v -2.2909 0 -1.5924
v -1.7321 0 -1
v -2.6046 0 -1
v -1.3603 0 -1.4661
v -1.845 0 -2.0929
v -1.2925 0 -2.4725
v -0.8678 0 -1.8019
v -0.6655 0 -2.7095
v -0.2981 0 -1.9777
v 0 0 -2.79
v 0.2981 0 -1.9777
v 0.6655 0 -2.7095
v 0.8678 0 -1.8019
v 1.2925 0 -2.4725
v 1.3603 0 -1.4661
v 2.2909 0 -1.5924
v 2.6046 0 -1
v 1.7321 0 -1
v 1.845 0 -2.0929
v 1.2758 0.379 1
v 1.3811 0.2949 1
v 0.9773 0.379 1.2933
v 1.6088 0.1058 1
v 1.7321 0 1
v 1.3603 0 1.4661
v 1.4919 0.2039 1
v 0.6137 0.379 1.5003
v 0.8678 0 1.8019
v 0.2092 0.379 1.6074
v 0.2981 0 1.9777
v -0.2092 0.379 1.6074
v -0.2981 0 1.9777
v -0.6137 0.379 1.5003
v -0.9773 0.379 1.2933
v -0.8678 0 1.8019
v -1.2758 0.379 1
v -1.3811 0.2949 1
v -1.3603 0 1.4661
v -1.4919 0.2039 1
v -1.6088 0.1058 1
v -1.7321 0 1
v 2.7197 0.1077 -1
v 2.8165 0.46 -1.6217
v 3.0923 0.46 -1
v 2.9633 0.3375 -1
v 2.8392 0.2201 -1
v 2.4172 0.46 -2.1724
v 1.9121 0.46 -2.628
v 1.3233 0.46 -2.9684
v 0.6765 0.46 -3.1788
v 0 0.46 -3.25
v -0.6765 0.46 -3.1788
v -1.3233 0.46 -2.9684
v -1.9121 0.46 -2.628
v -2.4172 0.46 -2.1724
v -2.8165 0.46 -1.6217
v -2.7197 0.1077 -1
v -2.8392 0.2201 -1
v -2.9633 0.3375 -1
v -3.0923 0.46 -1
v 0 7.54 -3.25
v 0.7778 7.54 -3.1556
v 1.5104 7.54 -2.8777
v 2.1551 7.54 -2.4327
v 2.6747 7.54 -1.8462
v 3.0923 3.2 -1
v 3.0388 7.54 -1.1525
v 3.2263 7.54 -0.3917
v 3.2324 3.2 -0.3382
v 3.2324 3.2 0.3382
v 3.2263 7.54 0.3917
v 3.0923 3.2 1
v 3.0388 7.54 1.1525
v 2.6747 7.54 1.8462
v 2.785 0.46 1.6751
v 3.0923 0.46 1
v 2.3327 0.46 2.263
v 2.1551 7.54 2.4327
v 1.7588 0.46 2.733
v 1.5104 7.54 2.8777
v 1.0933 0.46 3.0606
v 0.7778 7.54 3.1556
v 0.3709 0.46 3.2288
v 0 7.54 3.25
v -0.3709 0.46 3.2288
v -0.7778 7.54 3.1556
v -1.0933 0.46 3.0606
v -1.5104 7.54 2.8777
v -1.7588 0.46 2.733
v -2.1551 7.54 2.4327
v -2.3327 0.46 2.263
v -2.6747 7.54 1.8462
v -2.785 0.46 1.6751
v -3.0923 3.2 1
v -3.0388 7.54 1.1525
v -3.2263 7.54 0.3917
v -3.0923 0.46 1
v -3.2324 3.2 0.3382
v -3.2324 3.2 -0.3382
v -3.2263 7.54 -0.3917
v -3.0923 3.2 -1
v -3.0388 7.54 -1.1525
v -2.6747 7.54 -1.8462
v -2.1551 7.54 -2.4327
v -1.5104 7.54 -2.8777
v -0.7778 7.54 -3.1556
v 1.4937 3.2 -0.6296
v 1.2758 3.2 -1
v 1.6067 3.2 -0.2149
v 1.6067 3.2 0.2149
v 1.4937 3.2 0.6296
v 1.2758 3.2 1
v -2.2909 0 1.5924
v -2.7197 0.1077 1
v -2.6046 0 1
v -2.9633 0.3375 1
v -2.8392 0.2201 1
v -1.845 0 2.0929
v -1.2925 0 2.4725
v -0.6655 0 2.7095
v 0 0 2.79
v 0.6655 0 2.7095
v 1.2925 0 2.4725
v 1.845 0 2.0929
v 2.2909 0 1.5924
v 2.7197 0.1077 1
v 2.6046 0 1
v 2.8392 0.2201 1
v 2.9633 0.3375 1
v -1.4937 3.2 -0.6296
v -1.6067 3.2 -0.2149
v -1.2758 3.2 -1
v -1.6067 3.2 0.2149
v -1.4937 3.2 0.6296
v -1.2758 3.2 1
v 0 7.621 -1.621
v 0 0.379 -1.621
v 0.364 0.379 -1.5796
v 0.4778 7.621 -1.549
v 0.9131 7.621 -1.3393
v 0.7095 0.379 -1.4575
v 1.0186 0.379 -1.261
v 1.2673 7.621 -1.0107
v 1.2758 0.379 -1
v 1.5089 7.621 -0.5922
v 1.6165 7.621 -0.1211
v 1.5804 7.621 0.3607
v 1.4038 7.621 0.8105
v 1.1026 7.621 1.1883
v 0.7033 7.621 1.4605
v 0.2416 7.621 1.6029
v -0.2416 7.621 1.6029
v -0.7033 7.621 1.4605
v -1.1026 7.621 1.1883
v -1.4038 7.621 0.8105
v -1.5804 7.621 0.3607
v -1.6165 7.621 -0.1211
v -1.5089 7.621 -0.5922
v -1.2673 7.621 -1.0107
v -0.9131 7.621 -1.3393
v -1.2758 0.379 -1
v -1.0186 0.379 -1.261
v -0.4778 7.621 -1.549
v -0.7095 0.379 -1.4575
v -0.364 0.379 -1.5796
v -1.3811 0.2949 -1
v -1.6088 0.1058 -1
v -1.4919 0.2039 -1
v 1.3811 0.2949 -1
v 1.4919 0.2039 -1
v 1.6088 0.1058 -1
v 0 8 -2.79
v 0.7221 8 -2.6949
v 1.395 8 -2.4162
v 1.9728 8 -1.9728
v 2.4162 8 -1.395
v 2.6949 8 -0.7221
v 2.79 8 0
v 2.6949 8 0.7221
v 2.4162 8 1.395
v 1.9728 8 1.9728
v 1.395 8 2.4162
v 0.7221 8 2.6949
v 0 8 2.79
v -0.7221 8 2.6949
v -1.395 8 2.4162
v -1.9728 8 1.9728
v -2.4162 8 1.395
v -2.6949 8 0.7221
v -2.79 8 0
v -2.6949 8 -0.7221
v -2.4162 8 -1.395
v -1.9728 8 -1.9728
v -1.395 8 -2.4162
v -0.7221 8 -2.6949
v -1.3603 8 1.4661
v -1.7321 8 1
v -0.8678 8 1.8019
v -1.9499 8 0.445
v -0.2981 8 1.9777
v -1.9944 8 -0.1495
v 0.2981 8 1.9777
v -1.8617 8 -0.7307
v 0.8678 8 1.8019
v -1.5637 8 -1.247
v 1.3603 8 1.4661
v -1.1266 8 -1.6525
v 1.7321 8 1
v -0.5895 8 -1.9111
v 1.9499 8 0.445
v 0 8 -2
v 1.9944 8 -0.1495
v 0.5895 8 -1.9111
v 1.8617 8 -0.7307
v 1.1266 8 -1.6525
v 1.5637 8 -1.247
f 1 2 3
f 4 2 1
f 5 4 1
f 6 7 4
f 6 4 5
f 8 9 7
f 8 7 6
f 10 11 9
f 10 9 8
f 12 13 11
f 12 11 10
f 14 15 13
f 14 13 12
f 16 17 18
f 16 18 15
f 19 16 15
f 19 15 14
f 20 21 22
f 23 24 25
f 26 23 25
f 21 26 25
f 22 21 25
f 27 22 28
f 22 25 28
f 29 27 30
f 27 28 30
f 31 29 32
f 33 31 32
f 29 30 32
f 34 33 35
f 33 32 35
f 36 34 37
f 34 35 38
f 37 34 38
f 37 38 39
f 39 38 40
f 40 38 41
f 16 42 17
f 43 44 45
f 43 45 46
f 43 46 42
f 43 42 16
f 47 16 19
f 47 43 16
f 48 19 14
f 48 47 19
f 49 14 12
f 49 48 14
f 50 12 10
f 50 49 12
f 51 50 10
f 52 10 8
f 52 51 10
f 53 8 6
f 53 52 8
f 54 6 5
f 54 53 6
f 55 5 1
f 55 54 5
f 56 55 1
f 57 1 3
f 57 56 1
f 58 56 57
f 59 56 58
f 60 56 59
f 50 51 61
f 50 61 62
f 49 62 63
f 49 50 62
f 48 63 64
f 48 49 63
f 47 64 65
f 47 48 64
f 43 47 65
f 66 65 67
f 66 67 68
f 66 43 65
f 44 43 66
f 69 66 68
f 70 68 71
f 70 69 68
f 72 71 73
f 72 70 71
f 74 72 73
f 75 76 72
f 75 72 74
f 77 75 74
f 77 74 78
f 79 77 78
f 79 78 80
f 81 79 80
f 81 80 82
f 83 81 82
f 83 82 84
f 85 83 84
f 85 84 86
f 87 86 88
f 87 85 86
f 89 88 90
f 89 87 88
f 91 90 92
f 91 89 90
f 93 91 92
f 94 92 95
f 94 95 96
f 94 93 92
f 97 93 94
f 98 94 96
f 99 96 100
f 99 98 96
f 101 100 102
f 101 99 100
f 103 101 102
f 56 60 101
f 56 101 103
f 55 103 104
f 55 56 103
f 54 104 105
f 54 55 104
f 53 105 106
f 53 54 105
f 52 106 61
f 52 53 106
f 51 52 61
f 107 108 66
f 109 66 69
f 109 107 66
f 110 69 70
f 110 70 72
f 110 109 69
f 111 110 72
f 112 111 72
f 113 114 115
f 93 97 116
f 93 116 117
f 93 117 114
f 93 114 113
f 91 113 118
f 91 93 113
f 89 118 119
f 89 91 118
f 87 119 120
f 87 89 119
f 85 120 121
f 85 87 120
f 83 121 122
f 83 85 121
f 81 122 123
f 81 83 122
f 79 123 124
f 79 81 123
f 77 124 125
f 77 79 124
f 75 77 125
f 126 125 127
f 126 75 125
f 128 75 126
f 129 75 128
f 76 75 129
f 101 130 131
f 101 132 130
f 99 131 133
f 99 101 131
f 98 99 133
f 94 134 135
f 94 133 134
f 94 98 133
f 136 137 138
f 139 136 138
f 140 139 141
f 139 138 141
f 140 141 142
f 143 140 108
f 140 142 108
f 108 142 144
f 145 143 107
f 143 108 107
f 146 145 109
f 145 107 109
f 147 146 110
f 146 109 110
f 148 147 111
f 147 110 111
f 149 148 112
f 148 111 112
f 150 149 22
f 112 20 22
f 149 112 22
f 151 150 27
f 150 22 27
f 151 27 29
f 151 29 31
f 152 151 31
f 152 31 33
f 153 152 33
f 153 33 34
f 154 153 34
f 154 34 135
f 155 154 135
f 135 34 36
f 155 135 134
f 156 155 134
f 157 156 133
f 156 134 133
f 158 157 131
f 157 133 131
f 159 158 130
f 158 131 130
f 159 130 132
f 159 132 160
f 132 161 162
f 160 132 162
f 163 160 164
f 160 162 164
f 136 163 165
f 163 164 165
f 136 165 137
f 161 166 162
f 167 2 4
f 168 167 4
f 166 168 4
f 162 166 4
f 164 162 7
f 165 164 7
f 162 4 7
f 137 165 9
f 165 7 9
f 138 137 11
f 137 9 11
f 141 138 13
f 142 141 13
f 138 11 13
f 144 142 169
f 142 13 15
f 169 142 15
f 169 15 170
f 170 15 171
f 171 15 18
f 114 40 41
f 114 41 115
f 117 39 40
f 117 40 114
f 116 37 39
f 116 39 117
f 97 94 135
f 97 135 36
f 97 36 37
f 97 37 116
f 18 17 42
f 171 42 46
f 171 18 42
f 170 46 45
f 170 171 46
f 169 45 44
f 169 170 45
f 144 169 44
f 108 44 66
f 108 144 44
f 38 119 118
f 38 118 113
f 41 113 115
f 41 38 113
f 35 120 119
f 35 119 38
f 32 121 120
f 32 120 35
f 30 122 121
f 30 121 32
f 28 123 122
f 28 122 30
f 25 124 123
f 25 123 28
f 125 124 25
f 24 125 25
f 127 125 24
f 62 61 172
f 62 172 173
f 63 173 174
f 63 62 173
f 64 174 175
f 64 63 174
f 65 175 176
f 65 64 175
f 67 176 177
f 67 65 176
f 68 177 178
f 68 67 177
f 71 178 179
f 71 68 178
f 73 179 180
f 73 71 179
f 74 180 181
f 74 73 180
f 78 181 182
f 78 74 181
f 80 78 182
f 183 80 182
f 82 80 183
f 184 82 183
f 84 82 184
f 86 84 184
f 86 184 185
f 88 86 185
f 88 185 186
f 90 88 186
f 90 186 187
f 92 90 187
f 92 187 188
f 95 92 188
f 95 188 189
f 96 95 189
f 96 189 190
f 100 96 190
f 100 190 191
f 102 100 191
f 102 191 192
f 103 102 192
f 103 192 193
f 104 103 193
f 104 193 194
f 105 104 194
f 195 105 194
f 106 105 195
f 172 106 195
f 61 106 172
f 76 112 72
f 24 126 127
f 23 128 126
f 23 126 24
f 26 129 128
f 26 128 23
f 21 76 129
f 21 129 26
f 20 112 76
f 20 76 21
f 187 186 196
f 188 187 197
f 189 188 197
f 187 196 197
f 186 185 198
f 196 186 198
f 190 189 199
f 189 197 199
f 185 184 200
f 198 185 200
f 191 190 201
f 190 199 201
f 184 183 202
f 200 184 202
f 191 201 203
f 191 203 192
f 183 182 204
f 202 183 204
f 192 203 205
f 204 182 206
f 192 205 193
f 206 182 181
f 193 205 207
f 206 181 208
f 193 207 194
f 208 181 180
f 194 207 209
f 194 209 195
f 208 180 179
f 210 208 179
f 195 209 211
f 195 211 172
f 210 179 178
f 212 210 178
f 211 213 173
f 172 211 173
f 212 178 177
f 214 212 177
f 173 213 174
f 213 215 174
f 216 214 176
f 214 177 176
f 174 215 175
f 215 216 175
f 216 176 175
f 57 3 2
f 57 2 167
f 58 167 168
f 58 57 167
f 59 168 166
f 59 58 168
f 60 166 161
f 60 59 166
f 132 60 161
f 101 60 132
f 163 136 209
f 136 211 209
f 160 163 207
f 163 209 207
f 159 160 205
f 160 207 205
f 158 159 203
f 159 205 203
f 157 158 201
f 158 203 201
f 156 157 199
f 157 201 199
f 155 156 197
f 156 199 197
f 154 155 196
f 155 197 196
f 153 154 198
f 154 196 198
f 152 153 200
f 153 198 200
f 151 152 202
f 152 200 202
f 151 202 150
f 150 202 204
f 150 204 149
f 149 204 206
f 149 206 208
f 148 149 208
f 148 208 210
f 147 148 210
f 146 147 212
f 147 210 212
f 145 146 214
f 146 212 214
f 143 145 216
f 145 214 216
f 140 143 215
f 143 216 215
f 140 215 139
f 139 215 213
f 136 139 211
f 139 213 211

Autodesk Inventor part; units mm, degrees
ref_plane "YZ Plane" through (0, 0, 0) normal (1, 0, 0) x (0, 1, 0)
ref_plane "XZ Plane" through (0, 0, 0) normal (0, 1, 0) x (-1, 0, 0)
ref_plane "XY Plane" through (0, 0, 0) normal (0, 0, 1) x (1, 0, 0)
sketch "__4" plane through (0, 0, 0) normal (1, 0, 0) x (0, 1, 0)
  line L0 (0, 0) -> (8, 0)
  line L1 (8, 0) -> (8, -2.79)
  line L2 (8, -2.79) -> (7.54, -3.25)
  line L3 (7.54, -3.25) -> (0.46, -3.25)
  line L4 (0.46, -3.25) -> (0, -2.79)
  line L5 (0, -2.79) -> (0, 0)
  line L6 (0, 0) -> (8, 0)
revolve "Revolution1" add sketch "__4" angle 360 about axis through (0, 0, 0) along (0, -1, 0)
sketch "__5" plane through (0, 0, 0) normal (1, 0, 0) x (0, 1, 0)
  line L0 (0, 0) -> (8, 0)
  line L1 (8, 0) -> (8, -2)
  line L2 (8, -2) -> (7.621, -1.621)
  line L3 (7.621, -1.621) -> (0.379, -1.621)
  line L4 (0.379, -1.621) -> (0, -2)
  line L5 (0, -2) -> (0, 0)
  line L6 (0, 0) -> (8, 0)
revolve "Revolution2" cut sketch "__5" angle 360 about axis through (0, 0, 0) along (0, -1, 0)
thread "Thread1" size "M4x0.7" class "6H" standard "ISO Metric profile" full length
sketch "__6" plane through (0, 0, 0) normal (1, 0, 0) x (0, 1, 0)
  line L0 (3.2, 1) -> (0, 1)
  line L1 (0, 1) -> (0, -1)
  line L2 (0, -1) -> (3.2, -1)
  line L3 (3.2, -1) -> (3.2, 1)
extrude "Extrusion1" cut sketch "__6" along normal mid plane 13
properties part number "105.040" material "Steel"
